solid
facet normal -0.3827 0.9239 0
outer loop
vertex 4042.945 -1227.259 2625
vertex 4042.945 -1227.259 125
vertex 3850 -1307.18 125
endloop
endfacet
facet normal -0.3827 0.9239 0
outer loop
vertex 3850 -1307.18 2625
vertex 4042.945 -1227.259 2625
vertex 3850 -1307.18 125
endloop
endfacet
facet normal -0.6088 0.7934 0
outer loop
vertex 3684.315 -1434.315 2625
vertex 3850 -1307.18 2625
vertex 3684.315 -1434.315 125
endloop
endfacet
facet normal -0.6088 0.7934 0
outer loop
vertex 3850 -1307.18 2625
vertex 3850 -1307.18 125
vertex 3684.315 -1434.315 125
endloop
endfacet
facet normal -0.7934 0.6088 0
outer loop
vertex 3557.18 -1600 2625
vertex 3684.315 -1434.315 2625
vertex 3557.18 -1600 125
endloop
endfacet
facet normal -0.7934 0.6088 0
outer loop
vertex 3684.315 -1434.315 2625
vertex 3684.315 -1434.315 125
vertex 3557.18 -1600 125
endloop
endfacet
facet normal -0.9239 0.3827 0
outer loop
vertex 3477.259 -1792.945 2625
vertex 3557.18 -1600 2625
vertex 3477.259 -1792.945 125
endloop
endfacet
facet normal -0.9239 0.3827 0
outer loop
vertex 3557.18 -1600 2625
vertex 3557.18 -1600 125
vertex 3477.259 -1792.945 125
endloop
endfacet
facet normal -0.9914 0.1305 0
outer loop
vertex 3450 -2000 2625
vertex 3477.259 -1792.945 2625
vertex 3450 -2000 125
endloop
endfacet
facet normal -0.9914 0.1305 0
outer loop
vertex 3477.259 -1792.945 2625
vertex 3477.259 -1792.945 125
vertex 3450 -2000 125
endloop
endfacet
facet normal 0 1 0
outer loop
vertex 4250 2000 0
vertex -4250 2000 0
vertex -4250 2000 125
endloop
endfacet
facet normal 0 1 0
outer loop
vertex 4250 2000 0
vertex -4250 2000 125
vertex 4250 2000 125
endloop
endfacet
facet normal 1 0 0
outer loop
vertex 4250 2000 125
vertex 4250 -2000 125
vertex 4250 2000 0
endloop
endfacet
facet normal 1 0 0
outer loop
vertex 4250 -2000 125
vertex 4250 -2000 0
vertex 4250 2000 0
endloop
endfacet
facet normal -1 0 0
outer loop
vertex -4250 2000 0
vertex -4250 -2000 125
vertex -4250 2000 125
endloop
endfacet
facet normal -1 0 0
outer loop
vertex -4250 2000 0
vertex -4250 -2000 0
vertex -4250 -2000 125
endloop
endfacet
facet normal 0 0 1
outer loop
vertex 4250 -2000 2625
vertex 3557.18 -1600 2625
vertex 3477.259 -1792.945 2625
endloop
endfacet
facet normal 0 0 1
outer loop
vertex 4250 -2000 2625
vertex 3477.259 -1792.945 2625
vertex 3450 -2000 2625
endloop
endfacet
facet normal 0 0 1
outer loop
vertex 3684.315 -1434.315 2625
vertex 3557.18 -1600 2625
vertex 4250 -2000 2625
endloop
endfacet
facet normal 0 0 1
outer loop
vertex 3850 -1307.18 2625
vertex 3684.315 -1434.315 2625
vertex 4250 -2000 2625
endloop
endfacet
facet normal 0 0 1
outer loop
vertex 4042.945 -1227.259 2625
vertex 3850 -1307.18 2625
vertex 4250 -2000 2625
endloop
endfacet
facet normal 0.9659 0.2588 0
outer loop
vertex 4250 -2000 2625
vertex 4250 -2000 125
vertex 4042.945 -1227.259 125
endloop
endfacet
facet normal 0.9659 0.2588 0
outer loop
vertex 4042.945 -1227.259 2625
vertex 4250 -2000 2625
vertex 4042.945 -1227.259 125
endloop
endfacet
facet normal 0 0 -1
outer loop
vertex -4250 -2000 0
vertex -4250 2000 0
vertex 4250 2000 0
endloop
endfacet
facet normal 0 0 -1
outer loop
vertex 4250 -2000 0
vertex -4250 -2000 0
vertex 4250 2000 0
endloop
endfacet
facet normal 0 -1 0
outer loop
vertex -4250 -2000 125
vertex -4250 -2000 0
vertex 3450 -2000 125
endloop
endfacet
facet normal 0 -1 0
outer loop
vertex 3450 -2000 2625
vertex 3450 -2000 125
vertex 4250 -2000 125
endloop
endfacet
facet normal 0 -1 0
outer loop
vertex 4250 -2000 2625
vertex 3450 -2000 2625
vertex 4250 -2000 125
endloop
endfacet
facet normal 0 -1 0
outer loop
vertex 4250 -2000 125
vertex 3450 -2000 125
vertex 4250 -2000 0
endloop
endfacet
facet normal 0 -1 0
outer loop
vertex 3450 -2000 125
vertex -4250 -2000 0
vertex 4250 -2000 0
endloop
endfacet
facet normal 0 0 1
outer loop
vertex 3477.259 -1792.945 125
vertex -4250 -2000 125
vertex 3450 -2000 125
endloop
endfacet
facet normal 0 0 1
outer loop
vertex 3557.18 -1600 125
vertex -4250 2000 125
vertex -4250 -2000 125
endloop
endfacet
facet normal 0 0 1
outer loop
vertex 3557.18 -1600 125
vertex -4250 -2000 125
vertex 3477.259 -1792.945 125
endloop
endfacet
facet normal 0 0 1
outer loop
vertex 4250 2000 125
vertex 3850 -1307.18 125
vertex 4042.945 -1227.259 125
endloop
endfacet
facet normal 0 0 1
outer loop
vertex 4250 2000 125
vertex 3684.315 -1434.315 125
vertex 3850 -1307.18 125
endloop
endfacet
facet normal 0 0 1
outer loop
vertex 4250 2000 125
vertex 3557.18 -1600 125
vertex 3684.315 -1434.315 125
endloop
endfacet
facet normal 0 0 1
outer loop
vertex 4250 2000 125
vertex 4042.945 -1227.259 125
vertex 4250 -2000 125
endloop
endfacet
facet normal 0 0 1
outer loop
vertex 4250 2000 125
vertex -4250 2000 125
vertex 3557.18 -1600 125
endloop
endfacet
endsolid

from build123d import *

# Parameters (mm, degrees)
F0_W      = 8500
F0_H      = 4000
F1_DEPTH  = 100
F1_FACE_W = 8500
F1_FACE_H = 4000
F2_DEPTH  = 25
F4_DEPTH  = 2500


with BuildPart() as f1:
    # F0 (on Top) → F1 (new body)
    with BuildSketch(Plane.XY):
        Rectangle(F0_W, F0_H)
    extrude(amount=F1_DEPTH)

    # F1_face (on face) → F2 (join)
    with BuildSketch(Plane.XY.offset(100)):
        Rectangle(F1_FACE_W, F1_FACE_H)
    extrude(amount=F2_DEPTH)

    # F3 (on face) → F4 (join)
    with BuildSketch(Plane.XY.offset(125)):
        with BuildLine():
            Line((3450, -2000), (4250, -2000))
            Line((4250, -2000), (4042.944764, -1227.259339))
            ThreePointArc((4042.944764, -1227.259339), (3615.317328, -1512.990857), (3450, -2000))
        make_face()
    extrude(amount=F4_DEPTH)


solid = f1.part
